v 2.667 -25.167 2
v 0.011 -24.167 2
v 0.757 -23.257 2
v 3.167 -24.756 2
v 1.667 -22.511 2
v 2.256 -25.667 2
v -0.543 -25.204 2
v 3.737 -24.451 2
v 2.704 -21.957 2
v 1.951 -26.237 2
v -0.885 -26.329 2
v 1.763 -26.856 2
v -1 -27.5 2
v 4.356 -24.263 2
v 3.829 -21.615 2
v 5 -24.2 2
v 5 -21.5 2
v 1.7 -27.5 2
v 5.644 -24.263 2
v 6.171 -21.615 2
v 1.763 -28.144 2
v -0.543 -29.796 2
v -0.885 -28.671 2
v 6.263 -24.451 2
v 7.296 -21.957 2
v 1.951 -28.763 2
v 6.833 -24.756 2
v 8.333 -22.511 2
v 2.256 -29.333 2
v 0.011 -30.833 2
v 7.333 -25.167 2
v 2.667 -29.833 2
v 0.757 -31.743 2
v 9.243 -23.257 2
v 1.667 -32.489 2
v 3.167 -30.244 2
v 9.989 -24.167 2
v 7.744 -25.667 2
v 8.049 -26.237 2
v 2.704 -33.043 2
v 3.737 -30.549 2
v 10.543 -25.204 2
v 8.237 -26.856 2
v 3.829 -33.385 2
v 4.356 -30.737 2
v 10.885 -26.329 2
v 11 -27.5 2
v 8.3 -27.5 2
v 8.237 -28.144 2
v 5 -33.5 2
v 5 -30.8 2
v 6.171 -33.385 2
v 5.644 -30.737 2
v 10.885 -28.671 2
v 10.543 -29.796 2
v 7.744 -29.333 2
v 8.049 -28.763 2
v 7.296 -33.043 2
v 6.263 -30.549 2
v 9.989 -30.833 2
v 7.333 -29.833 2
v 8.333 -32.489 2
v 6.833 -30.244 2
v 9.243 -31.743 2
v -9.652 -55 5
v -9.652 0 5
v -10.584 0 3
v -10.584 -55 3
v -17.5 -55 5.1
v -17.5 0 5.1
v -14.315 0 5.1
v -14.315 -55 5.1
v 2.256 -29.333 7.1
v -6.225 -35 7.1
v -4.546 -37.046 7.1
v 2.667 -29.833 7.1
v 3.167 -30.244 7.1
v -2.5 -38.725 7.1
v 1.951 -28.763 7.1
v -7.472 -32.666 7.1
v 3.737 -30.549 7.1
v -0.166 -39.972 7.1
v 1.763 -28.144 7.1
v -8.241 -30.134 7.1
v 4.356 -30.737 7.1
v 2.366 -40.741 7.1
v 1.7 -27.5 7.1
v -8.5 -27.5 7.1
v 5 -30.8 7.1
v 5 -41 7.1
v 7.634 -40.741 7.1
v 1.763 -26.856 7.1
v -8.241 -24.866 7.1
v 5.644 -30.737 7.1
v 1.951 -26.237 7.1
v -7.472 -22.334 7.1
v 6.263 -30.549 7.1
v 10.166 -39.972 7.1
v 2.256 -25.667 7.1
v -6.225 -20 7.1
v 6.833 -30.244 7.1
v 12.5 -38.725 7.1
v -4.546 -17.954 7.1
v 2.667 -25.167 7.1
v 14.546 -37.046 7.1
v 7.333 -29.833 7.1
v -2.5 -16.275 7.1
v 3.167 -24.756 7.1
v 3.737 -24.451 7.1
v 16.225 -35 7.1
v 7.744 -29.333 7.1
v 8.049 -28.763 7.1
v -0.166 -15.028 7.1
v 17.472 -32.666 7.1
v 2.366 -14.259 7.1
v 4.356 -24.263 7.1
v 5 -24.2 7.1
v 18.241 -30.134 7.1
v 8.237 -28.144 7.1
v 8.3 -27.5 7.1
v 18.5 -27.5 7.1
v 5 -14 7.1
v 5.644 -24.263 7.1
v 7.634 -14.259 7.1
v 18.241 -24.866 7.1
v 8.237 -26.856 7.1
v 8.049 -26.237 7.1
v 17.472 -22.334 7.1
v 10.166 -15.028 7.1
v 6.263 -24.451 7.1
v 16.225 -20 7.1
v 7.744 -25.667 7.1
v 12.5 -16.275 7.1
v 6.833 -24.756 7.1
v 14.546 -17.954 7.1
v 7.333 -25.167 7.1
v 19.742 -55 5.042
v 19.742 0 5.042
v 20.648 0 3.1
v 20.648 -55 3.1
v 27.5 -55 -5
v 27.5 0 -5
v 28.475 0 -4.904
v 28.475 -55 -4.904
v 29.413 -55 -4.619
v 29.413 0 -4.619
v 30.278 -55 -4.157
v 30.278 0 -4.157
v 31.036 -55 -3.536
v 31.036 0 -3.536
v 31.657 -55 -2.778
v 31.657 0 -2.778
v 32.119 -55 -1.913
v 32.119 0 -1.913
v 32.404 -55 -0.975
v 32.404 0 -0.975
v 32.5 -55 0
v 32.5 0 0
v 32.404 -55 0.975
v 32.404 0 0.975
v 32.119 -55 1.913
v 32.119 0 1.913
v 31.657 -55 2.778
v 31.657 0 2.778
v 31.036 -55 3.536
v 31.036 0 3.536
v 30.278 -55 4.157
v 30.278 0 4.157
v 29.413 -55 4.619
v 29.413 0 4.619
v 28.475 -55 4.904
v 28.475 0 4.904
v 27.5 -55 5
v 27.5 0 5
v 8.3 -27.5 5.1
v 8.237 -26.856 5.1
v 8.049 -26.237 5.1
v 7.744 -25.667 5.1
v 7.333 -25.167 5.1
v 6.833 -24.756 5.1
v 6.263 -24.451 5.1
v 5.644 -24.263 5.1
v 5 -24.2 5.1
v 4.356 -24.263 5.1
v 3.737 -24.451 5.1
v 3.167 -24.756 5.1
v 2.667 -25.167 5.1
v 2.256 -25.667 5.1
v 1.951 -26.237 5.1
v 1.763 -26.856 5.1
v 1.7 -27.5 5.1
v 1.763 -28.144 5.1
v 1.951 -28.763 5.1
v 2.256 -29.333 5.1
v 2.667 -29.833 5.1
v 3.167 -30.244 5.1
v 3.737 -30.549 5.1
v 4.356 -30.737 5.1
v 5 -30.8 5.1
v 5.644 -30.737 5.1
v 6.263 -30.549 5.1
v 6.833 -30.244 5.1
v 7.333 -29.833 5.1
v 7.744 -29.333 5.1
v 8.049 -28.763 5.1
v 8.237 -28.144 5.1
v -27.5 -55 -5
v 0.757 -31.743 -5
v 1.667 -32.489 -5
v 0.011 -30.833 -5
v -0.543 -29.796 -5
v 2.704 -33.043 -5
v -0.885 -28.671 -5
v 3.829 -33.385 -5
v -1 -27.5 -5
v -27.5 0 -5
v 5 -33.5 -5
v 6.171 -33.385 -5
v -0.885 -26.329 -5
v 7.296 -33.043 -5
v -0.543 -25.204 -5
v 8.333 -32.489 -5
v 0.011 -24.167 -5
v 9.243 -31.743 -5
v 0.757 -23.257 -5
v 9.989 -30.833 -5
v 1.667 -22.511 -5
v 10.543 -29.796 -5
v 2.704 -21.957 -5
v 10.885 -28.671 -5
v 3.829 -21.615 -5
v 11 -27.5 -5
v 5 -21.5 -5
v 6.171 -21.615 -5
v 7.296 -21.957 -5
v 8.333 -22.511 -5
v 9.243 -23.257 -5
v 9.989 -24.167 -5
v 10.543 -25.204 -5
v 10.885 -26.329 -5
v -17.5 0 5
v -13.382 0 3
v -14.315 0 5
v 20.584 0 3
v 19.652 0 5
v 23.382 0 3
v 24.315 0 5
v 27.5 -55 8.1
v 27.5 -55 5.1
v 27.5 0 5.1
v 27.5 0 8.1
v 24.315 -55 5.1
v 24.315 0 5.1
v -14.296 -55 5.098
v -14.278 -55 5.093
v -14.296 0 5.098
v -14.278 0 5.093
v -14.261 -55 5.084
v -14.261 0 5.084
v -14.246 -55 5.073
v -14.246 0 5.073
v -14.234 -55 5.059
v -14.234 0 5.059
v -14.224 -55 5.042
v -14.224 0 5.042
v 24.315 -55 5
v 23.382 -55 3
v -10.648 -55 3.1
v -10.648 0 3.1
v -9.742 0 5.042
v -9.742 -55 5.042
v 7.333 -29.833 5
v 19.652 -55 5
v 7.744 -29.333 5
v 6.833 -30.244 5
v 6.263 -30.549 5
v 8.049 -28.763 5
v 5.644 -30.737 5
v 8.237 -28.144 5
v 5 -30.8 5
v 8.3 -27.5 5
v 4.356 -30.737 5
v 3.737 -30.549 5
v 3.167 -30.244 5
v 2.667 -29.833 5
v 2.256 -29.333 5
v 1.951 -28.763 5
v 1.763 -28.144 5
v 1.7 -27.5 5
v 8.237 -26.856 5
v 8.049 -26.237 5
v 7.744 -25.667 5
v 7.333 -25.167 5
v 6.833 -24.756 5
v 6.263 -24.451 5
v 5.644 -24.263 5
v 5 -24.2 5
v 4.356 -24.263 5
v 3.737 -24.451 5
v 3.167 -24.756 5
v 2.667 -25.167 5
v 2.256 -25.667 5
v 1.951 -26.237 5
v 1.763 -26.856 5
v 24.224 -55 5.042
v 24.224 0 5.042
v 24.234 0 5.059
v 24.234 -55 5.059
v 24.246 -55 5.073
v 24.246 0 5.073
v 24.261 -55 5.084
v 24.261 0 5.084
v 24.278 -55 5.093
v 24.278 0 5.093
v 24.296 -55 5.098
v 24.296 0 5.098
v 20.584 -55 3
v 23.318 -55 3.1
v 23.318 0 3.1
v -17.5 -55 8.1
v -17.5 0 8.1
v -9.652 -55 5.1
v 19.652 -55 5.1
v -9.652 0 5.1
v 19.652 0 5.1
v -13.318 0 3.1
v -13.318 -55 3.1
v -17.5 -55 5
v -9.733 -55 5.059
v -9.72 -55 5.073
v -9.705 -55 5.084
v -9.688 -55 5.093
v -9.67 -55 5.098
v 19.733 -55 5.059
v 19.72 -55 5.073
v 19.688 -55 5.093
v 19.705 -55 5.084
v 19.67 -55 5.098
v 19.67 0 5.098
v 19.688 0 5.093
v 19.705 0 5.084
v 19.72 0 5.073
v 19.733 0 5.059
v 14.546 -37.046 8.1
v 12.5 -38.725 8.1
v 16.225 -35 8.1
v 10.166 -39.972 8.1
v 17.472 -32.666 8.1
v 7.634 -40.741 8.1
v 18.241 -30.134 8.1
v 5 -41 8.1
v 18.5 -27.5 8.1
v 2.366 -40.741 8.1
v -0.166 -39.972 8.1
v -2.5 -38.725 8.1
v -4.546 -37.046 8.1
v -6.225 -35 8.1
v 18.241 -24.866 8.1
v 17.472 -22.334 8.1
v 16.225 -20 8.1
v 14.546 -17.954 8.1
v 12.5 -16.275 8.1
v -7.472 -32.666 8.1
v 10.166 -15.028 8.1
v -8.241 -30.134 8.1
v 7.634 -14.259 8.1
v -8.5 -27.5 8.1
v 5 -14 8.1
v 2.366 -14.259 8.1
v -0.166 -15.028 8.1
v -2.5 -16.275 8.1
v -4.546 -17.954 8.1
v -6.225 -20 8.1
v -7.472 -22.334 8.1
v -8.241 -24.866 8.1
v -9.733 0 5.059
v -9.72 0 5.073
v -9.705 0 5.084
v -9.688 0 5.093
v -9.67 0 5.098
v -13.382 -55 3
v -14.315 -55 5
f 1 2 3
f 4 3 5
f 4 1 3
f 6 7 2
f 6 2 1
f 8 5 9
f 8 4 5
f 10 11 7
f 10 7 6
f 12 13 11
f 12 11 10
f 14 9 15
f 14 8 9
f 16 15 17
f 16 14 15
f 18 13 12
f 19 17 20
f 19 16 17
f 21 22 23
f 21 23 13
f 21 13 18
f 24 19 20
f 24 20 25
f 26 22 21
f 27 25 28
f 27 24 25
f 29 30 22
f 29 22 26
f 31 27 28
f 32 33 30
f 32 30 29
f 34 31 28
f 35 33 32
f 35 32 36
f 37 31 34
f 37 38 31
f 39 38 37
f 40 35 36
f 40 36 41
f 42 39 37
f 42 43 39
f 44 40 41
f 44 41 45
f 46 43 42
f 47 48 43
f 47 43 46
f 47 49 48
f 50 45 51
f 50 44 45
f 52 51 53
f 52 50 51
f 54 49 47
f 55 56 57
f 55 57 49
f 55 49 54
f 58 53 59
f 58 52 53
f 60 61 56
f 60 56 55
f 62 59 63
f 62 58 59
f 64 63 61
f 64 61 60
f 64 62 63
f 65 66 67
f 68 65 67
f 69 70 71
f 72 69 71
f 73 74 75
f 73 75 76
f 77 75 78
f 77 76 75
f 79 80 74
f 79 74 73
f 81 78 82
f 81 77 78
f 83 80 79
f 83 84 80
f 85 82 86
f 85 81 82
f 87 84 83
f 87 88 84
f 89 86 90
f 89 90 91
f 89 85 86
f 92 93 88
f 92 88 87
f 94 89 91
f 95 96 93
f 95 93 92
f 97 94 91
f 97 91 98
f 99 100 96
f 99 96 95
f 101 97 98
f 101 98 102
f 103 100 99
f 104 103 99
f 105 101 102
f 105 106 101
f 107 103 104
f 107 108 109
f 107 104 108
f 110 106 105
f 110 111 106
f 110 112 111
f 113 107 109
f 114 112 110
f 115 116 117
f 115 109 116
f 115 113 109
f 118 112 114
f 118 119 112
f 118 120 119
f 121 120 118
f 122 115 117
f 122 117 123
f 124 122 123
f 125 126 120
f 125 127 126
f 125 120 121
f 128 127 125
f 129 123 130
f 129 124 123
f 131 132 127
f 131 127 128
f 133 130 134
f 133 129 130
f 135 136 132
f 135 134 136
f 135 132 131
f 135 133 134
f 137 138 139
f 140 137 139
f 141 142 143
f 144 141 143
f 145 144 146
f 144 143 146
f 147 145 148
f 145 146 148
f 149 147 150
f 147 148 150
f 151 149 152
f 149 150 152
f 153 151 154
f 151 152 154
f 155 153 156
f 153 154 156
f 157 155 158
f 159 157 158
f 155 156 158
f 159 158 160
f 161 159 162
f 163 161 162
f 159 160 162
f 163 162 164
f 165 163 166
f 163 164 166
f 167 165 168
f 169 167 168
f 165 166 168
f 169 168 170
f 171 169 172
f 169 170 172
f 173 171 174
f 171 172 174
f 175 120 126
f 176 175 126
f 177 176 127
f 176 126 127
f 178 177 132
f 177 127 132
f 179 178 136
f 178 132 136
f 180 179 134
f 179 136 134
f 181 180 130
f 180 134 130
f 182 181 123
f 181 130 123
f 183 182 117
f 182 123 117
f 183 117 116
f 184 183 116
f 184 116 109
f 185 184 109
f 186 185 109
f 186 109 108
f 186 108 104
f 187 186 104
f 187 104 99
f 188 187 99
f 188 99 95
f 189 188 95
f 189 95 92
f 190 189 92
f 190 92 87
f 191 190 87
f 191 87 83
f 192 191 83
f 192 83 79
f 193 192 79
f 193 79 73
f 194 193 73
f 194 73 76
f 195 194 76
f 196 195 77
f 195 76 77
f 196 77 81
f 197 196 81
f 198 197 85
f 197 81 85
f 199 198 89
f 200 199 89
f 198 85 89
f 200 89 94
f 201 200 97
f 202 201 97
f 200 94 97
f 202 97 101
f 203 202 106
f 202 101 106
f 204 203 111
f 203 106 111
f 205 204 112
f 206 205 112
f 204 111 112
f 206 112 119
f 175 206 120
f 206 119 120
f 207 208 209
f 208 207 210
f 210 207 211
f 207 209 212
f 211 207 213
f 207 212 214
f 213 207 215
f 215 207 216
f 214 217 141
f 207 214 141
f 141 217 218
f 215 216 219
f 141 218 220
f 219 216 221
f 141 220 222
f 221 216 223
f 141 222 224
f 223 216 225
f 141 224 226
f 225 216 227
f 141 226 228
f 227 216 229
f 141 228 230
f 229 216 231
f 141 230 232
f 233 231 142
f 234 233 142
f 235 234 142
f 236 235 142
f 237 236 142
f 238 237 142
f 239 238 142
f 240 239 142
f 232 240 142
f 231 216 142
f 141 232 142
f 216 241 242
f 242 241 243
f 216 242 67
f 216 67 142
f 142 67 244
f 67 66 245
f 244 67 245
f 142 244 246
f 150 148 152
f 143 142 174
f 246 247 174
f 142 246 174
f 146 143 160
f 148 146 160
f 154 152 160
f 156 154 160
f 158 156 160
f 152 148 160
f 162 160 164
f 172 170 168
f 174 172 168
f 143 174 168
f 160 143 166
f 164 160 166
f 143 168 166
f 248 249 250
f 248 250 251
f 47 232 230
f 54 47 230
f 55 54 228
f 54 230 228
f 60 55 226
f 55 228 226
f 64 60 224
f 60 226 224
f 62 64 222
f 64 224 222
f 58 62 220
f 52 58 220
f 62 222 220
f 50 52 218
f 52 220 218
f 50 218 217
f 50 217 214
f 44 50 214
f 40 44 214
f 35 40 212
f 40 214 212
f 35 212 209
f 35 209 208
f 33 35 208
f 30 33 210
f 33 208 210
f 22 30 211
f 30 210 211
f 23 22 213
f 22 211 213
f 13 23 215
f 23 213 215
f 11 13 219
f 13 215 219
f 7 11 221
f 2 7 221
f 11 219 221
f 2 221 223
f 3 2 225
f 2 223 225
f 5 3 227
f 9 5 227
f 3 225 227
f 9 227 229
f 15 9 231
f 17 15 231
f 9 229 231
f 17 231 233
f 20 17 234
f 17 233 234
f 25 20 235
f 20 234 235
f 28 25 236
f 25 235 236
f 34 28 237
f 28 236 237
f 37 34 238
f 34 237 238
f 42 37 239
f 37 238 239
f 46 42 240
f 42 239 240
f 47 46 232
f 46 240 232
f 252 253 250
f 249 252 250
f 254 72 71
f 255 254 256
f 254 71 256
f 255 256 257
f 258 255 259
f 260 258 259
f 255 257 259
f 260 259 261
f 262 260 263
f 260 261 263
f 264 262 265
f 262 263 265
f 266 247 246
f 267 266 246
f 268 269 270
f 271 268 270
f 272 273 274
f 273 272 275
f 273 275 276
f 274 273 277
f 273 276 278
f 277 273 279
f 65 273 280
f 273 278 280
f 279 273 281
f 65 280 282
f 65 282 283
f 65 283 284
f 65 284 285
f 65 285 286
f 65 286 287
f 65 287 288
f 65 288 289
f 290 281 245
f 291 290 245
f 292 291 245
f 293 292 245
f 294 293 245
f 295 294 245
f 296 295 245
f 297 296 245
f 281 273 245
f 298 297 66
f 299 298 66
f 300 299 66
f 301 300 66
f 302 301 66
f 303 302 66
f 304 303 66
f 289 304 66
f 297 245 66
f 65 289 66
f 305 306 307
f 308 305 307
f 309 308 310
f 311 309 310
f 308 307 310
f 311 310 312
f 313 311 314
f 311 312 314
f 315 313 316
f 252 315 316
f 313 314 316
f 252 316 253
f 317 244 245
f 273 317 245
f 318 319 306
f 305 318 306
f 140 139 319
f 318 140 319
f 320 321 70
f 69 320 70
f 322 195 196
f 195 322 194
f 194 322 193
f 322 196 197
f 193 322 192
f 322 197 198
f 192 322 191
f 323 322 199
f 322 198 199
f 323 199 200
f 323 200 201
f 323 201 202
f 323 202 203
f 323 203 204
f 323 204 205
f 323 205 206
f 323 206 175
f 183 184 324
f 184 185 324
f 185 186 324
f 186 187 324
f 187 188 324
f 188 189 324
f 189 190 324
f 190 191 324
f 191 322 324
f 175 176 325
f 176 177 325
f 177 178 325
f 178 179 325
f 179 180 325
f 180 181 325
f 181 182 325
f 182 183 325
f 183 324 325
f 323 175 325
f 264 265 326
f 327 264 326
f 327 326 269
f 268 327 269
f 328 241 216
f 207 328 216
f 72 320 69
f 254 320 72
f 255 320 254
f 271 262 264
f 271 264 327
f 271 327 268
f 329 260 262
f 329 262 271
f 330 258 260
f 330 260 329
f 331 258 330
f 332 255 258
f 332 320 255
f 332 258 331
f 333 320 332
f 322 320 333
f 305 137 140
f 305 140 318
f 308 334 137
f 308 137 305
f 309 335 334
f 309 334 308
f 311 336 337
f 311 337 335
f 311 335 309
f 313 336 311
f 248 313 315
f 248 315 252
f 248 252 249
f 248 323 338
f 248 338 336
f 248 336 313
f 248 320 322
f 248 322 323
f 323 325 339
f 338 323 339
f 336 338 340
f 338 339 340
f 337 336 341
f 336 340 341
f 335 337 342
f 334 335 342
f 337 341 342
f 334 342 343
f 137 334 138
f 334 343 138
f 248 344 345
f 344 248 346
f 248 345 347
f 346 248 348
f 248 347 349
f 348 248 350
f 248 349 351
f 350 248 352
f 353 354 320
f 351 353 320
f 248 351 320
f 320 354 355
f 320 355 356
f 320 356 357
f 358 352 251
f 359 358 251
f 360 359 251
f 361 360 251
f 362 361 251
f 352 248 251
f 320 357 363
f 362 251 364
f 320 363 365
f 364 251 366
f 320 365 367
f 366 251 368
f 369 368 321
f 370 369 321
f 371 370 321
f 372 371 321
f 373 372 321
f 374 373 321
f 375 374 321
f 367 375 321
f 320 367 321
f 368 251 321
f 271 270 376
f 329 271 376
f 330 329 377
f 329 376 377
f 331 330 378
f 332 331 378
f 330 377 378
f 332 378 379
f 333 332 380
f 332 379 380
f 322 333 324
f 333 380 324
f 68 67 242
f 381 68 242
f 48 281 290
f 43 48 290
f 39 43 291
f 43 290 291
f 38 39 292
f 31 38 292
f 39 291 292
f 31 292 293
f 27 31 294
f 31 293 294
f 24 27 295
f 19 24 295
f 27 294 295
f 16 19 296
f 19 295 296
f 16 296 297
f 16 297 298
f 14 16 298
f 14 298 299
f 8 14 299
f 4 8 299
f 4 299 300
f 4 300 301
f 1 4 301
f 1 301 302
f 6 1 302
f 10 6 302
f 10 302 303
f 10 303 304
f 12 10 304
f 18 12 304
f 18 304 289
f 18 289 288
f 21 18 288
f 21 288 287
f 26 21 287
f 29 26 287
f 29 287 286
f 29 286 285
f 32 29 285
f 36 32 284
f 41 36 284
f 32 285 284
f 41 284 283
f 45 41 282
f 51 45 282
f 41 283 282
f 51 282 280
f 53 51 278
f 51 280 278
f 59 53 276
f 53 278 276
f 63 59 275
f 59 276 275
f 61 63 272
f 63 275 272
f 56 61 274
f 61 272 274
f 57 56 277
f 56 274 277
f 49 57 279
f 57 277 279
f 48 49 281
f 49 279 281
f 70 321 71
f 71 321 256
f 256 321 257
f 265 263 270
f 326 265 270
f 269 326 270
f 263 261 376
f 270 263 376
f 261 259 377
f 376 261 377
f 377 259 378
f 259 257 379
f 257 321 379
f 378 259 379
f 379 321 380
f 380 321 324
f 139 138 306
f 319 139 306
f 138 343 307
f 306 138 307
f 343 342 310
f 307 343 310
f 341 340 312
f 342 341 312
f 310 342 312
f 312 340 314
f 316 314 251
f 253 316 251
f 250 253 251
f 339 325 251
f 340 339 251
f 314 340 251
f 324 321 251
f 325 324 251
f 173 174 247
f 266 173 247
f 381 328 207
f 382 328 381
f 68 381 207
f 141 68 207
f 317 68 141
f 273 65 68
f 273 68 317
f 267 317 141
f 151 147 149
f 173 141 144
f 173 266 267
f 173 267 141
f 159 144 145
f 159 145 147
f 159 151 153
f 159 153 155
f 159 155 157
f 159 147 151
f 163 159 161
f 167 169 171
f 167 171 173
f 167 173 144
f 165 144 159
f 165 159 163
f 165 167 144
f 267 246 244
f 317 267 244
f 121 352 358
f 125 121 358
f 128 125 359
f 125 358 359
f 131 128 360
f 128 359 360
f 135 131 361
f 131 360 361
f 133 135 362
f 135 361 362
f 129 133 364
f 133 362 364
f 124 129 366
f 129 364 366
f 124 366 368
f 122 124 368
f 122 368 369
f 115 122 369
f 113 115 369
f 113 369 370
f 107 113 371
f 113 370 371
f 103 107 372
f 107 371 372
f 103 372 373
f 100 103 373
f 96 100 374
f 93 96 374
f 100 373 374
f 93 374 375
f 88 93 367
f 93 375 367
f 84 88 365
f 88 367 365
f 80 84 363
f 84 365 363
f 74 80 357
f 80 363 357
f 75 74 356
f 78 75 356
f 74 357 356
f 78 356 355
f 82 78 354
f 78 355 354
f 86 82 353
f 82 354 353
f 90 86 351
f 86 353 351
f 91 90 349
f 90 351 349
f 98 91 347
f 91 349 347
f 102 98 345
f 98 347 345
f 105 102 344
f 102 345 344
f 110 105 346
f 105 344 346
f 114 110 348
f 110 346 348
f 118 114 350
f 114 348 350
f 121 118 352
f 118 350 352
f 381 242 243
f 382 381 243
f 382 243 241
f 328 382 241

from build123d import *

# Parameters (mm, degrees)
F1_DEPTH  = 55
F3_DEPTH  = 55
F4_R      = 13.5
F5_DEPTH  = 1
F6_R      = 3.3
F7_DEPTH  = 12.101
F8_R      = 3.3
F9_DEPTH  = 25
F10_R     = 6
F11_DEPTH = 7


with BuildPart() as f1:
    # F0 (on Front) → F1 (new body)
    with BuildSketch(Plane.XZ):
        with BuildLine():
            Line((-27.5, -5), (27.5, -5))
            ThreePointArc((27.5, -5), (32.5, 0), (27.5, 5))
            Line((27.5, 5), (24.314648696, 5))
            Line((24.314648696, 5), (23.3820333797, 3))
            Line((23.3820333797, 3), (20.5841874307, 3))
            Line((20.5841874307, 3), (19.6515721144, 5))
            Line((19.6515721144, 5), (-9.6515721144, 5))
            Line((-9.6515721144, 5), (-10.5841874307, 3))
            Line((-10.5841874307, 3), (-13.3820333797, 3))
            Line((-13.3820333797, 3), (-14.314648696, 5))
            Line((-14.314648696, 5), (-17.5, 5))
            Line((-17.5, 5), (-27.5, -5))
        make_face()
    extrude(amount=F1_DEPTH)


with BuildPart() as f3:
    # F2 (on Front) → F3 (new body)
    with BuildSketch(Plane.XZ):
        with BuildLine():
            Line((23.3183263536, 3.1), (24.2240179173, 5.0422618262))
            ThreePointArc((24.2240179173, 5.0422618262), (24.2609187351, 5.0843391446), (24.314648696, 5.1))
            Line((24.314648696, 5.1), (27.5, 5.1))
            Line((27.5, 5.1), (27.5, 8.1))
            Line((27.5, 8.1), (-17.5, 8.1))
            Line((-17.5, 8.1), (-17.5, 5.1))
            Line((-17.5, 5.1), (-14.314648696, 5.1))
            ThreePointArc((-14.314648696, 5.1), (-14.2609187351, 5.0843391446), (-14.2240179173, 5.0422618262))
            Line((-14.2240179173, 5.0422618262), (-13.3183263536, 3.1))
            Line((-13.3183263536, 3.1), (-10.6478944568, 3.1))
            Line((-10.6478944568, 3.1), (-9.7422028931, 5.0422618262))
            ThreePointArc((-9.7422028931, 5.0422618262), (-9.7053020752, 5.0843391446), (-9.6515721144, 5.1))
            Line((-9.6515721144, 5.1), (19.6515721144, 5.1))
            ThreePointArc((19.6515721144, 5.1), (19.7053020752, 5.0843391446), (19.7422028931, 5.0422618262))
            Line((19.7422028931, 5.0422618262), (20.6478944568, 3.1))
            Line((20.6478944568, 3.1), (23.3183263536, 3.1))
        make_face()
    extrude(amount=F3_DEPTH)

    # F4 (on face) → F5 (cut)
    with BuildSketch(Plane.XY.offset(8.1)):
        with Locations((5, -27.5)):
            Circle(F4_R)
    extrude(amount=-F5_DEPTH, mode=Mode.SUBTRACT)


with BuildPart() as f7_tool:
    # F6 (on face) → F7 (new body, through all)
    with BuildSketch(Plane.XY.offset(7.1)):
        with Locations((5, -27.5)):
            Circle(F6_R)
    extrude(amount=-F7_DEPTH)


with BuildPart() as f1_1:
    add(f1.part)

    # F7: cut by f7_tool
    add(f7_tool.part, mode=Mode.SUBTRACT)

    # F8 (on face) → F9 (cut)
    with BuildSketch(Plane.XY.offset(5)):
        with Locations((5, -27.5)):
            Circle(F8_R)
    extrude(amount=-F9_DEPTH, mode=Mode.SUBTRACT)

    # F10 (on face) → F11 (cut)
    with BuildSketch(Plane(origin=(0, 0, -5), x_dir=(1, 0, 0), z_dir=(0, 0, -1))):
        with Locations((5, 27.5)):
            Circle(F10_R)
    extrude(amount=-F11_DEPTH, mode=Mode.SUBTRACT)


with BuildPart() as f3_1:
    add(f3.part)

    # F7: cut by f7_tool
    add(f7_tool.part, mode=Mode.SUBTRACT)


solid = Compound([f1_1.part, f3_1.part])
